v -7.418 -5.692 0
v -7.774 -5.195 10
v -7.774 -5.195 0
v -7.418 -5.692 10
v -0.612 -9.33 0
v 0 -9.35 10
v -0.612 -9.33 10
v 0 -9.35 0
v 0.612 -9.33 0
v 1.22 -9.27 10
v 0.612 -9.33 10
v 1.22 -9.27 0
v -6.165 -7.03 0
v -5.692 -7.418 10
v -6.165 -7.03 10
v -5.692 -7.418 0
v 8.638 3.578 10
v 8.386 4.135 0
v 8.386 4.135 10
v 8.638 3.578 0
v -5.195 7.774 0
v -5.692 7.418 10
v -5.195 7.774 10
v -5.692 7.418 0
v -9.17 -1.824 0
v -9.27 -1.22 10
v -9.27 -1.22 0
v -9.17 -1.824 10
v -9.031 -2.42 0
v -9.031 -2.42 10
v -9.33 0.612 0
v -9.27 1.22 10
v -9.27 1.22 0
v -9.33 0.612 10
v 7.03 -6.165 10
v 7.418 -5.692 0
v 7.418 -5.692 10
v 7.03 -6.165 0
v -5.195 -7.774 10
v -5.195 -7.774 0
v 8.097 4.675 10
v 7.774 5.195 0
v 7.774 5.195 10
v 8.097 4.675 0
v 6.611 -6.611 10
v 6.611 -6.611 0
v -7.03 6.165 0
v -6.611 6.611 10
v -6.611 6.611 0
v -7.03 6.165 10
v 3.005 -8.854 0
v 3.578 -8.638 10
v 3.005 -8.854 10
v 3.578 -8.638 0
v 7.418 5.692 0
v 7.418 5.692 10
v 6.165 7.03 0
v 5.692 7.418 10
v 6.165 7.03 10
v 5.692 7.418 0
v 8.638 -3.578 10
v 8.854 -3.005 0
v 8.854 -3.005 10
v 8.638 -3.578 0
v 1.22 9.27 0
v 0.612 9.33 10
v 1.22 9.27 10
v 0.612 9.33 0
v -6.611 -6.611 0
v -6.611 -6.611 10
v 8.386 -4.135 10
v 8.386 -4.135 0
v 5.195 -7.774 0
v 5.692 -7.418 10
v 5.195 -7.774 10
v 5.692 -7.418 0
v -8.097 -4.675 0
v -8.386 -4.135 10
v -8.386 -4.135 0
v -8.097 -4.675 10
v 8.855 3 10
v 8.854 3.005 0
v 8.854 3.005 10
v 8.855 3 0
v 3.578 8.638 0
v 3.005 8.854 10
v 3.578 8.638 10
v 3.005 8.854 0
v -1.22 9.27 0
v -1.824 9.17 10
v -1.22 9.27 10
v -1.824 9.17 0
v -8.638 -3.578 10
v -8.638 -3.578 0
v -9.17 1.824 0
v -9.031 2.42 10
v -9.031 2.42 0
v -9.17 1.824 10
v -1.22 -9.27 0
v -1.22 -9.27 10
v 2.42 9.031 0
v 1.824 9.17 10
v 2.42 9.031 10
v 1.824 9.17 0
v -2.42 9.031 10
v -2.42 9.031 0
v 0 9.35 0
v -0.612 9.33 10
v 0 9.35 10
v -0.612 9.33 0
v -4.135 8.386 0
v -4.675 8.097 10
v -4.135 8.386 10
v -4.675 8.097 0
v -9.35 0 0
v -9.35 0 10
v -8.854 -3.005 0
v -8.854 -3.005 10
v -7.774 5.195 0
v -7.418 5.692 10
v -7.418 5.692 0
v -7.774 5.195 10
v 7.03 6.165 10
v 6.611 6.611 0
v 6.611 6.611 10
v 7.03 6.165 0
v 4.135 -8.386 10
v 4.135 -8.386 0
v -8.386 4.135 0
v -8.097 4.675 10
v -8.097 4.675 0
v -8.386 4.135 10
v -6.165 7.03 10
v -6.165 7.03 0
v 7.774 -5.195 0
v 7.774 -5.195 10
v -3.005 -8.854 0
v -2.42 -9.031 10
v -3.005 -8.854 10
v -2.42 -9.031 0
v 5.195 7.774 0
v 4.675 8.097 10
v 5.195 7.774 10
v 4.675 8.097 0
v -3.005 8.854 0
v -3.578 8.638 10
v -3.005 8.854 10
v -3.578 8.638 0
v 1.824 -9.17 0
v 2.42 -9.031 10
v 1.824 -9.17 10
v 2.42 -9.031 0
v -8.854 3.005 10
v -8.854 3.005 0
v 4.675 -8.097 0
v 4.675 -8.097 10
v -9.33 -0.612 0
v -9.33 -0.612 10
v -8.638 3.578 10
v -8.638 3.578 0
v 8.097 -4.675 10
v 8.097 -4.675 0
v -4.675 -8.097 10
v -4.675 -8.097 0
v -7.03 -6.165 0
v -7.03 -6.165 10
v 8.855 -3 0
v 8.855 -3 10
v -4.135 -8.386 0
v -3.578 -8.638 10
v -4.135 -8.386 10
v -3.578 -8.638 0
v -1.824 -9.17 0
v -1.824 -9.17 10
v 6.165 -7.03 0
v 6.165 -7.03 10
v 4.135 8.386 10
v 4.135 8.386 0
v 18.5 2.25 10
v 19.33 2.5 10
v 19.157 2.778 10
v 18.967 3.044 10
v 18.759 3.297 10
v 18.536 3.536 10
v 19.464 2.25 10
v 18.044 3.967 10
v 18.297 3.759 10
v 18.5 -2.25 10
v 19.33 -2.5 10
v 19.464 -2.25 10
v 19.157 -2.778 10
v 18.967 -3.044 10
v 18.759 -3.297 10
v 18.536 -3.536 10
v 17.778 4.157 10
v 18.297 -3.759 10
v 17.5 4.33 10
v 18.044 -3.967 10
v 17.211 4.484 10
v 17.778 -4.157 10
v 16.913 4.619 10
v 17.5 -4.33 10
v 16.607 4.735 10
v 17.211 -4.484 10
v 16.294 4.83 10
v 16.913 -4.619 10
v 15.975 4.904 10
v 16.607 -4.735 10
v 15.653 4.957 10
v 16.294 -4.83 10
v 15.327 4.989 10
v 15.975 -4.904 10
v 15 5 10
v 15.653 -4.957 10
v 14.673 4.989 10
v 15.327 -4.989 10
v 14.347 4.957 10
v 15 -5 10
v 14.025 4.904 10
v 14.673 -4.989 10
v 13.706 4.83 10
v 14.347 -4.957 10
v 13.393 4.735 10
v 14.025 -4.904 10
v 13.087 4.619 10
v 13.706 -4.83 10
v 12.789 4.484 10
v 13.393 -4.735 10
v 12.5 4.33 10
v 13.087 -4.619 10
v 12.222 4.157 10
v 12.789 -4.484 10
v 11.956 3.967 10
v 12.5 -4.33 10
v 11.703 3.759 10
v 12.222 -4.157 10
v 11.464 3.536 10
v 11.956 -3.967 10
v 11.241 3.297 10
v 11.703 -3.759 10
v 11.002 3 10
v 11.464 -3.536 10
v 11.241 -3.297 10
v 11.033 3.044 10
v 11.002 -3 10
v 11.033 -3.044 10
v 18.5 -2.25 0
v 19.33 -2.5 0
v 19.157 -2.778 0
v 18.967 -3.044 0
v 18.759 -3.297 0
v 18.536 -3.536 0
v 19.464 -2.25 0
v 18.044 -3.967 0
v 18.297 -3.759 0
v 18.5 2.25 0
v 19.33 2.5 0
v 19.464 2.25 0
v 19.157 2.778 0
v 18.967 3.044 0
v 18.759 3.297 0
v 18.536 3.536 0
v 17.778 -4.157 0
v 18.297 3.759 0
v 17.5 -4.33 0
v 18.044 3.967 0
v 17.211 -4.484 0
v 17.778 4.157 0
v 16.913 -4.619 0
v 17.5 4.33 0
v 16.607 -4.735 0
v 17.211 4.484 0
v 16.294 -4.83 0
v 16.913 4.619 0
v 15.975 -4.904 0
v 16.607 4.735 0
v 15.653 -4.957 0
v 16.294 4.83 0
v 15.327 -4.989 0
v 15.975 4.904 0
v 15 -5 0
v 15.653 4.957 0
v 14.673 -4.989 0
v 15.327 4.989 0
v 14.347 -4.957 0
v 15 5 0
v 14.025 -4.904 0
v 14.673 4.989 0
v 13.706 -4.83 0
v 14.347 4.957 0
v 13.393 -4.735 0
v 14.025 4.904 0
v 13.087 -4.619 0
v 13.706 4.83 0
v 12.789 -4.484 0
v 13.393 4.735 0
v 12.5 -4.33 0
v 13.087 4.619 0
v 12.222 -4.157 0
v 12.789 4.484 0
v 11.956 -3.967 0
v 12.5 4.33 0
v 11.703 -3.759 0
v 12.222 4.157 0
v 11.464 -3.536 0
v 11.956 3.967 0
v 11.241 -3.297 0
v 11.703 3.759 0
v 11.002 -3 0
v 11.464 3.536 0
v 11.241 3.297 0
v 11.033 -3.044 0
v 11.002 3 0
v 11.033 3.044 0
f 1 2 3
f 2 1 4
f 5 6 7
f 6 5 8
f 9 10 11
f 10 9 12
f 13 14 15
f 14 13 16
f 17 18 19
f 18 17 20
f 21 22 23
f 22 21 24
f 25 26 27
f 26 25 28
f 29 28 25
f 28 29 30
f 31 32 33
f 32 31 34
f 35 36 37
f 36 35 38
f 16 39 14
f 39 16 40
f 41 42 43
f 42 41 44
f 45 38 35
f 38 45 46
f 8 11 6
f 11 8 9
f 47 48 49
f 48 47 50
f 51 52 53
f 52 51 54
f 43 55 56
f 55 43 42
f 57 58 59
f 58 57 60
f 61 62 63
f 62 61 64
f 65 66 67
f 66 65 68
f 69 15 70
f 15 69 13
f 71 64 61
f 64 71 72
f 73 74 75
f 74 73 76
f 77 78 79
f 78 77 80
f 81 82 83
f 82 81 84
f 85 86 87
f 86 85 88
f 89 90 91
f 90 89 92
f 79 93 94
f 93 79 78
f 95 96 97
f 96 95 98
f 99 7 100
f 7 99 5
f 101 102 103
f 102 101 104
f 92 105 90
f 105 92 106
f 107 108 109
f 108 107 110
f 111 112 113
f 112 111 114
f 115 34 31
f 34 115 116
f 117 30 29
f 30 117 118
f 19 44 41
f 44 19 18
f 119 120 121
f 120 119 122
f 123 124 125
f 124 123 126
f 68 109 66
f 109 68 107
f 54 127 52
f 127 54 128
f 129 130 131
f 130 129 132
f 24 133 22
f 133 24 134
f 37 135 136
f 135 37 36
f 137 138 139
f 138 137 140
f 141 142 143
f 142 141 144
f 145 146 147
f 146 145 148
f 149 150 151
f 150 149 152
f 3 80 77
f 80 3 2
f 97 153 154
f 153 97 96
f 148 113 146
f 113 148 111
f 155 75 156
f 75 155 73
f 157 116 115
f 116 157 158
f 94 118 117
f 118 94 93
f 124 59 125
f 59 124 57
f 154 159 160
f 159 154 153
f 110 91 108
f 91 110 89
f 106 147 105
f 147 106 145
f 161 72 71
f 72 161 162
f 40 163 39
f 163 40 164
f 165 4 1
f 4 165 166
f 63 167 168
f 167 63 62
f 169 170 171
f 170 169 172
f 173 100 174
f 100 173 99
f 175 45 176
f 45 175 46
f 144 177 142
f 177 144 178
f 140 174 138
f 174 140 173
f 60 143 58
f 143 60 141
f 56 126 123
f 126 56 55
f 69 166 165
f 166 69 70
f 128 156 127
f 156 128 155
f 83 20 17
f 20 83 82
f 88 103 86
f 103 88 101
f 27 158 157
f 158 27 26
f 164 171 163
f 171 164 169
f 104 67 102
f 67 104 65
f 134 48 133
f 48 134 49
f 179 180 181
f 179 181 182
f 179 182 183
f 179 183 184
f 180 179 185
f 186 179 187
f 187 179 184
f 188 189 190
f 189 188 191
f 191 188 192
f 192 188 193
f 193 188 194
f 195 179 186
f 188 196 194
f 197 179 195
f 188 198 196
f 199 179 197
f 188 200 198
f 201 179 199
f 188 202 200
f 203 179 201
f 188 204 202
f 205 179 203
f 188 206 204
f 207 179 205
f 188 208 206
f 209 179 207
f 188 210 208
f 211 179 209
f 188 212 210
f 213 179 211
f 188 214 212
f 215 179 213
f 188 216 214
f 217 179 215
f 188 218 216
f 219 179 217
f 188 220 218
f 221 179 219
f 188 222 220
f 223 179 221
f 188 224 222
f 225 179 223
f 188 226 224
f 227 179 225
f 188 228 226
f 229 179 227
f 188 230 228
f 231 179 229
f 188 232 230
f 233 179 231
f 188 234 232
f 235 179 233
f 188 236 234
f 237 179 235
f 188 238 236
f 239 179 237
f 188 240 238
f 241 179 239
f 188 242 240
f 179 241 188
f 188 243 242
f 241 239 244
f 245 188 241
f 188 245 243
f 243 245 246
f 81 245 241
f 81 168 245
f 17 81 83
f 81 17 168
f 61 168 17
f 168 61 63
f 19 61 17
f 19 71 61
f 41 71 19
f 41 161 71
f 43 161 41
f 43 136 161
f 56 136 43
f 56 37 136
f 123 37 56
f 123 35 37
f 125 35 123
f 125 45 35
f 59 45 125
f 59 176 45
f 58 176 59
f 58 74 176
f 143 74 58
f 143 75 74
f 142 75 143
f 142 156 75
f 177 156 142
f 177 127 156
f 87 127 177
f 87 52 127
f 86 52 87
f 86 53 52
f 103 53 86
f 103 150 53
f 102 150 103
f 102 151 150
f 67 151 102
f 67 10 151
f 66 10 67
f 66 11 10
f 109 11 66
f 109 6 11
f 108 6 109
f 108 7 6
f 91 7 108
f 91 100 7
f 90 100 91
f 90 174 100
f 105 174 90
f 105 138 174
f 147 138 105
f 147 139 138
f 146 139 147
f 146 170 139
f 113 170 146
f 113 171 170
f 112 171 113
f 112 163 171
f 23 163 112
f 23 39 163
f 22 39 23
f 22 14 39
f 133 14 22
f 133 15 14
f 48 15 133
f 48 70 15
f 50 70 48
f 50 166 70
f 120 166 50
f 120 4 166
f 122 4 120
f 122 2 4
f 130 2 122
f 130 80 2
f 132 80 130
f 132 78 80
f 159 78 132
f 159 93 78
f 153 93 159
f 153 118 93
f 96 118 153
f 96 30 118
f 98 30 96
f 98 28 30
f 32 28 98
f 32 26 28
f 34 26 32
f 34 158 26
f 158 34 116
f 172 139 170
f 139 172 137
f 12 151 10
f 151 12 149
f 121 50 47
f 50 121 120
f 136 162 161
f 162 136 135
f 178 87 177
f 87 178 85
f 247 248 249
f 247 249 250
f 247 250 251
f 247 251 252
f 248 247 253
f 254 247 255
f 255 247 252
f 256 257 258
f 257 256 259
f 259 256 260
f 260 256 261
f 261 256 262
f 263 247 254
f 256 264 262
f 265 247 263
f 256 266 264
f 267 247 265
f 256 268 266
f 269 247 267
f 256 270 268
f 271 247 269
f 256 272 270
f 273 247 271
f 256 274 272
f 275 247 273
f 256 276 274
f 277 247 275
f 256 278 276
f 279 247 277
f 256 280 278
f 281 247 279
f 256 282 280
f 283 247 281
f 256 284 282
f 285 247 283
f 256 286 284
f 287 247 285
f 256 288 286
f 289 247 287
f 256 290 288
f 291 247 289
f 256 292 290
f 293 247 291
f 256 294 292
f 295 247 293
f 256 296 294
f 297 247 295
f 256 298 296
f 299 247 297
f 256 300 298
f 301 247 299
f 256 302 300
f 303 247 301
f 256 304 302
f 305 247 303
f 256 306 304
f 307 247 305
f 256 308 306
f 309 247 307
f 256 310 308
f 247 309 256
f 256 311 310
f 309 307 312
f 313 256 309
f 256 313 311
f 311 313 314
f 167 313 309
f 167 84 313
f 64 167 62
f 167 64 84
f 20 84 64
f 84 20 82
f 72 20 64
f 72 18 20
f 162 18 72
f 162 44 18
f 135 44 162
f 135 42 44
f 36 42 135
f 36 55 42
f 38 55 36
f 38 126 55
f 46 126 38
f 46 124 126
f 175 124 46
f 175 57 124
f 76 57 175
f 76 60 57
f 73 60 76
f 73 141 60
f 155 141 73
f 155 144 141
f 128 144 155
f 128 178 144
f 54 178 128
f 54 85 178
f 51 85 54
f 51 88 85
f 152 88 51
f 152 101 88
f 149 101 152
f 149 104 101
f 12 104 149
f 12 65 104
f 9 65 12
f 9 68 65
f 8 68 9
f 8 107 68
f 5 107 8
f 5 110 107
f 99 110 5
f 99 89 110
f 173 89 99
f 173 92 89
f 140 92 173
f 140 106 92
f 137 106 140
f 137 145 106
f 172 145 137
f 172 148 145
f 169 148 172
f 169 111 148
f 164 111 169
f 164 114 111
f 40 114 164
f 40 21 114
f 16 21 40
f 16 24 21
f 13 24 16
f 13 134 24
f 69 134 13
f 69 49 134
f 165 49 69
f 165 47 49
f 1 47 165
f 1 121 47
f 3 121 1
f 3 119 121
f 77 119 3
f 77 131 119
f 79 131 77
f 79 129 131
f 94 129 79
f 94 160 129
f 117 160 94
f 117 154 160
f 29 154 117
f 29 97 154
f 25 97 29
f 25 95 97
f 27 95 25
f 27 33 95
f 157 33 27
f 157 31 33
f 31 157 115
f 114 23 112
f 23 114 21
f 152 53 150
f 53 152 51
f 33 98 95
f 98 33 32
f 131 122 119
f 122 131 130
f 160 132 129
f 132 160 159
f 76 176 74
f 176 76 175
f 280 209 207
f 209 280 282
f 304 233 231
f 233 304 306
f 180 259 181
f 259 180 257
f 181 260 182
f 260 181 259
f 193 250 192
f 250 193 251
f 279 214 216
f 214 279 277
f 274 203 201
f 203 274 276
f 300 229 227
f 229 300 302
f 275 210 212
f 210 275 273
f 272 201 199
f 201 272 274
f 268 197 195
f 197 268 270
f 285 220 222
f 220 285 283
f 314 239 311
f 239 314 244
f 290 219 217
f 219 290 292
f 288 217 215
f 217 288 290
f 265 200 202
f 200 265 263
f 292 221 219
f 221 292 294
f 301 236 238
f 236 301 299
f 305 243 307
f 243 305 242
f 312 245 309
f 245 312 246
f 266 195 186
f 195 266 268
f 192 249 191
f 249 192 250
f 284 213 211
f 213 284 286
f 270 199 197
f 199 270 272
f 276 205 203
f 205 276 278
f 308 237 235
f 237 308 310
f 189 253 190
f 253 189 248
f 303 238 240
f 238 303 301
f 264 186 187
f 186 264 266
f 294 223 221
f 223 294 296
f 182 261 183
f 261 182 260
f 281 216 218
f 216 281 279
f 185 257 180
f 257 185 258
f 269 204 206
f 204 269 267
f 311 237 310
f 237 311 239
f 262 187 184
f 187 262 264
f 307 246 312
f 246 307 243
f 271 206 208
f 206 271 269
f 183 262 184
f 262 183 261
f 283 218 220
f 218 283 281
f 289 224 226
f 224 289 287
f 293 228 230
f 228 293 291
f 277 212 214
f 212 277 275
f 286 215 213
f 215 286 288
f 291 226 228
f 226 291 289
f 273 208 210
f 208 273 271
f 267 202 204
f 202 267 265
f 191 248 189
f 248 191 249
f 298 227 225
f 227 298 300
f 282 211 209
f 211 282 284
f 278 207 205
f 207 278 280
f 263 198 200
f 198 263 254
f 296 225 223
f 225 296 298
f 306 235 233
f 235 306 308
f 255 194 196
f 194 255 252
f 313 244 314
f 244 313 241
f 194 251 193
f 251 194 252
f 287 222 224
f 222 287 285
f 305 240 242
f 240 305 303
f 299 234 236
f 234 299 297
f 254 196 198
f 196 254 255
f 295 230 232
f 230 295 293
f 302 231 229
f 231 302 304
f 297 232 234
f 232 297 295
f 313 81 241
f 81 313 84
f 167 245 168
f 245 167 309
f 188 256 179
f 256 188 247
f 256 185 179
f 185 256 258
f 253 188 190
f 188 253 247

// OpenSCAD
// Tubing/stand rod snap-on clip
// Print orientation: flat on bed, z = 0 up to z = 10

// ---------- Parameters ----------
stand_d      = 12.7;   // stand rod diameter
stand_wall   = 3;      // stand ring wall thickness
stand_open   = 10;     // stand ring opening width (y span)
stand_x0     = -18.35; // stand ring centre x (12.7+2*3)/2 offset for opening

tube_d       = 6;      // tubing inner diameter
tube_wall    = 2;      // tubing ring wall thickness
tube_x       = 15;     // tubing ring centre x
tube_open    = 4.5;    // tubing ring opening width (y span)

bridge_w     = 6;      // bridge width (Y)
bridge_x0    = 8;      // bridge start x
bridge_x1    = 12;     // bridge end x

h            = 10;     // extrusion height (Z)
eps          = 0.5;    // cutter overshoot

$fn = 96;

// ---------- Model ----------
difference() {
    union() {
        // Stand ring
        cylinder(d = stand_d + 2 * stand_wall, h = h);
        // Tubing ring
        translate([tube_x, 0, 0])
            cylinder(d = tube_d + 2 * tube_wall, h = h);
        // Bridge
        translate([bridge_x0, -bridge_w / 2, 0])
            cube([bridge_x1 - bridge_x0, bridge_w, h]);
    }
    // Stand opening (x < 0, -5 < y < 5)
    translate([stand_x0 - eps, -stand_open / 2, -eps])
        cube([eps + stand_x0 + tube_x, stand_open, h + 2 * eps]);
    // Tubing opening (x > 15, -2.25 < y < 2.25)
    translate([tube_x + tube_d / 2 + eps, -tube_open / 2, -eps])
        cube([eps + tube_d / 2 + 1, tube_open, h + 2 * eps]);
}
